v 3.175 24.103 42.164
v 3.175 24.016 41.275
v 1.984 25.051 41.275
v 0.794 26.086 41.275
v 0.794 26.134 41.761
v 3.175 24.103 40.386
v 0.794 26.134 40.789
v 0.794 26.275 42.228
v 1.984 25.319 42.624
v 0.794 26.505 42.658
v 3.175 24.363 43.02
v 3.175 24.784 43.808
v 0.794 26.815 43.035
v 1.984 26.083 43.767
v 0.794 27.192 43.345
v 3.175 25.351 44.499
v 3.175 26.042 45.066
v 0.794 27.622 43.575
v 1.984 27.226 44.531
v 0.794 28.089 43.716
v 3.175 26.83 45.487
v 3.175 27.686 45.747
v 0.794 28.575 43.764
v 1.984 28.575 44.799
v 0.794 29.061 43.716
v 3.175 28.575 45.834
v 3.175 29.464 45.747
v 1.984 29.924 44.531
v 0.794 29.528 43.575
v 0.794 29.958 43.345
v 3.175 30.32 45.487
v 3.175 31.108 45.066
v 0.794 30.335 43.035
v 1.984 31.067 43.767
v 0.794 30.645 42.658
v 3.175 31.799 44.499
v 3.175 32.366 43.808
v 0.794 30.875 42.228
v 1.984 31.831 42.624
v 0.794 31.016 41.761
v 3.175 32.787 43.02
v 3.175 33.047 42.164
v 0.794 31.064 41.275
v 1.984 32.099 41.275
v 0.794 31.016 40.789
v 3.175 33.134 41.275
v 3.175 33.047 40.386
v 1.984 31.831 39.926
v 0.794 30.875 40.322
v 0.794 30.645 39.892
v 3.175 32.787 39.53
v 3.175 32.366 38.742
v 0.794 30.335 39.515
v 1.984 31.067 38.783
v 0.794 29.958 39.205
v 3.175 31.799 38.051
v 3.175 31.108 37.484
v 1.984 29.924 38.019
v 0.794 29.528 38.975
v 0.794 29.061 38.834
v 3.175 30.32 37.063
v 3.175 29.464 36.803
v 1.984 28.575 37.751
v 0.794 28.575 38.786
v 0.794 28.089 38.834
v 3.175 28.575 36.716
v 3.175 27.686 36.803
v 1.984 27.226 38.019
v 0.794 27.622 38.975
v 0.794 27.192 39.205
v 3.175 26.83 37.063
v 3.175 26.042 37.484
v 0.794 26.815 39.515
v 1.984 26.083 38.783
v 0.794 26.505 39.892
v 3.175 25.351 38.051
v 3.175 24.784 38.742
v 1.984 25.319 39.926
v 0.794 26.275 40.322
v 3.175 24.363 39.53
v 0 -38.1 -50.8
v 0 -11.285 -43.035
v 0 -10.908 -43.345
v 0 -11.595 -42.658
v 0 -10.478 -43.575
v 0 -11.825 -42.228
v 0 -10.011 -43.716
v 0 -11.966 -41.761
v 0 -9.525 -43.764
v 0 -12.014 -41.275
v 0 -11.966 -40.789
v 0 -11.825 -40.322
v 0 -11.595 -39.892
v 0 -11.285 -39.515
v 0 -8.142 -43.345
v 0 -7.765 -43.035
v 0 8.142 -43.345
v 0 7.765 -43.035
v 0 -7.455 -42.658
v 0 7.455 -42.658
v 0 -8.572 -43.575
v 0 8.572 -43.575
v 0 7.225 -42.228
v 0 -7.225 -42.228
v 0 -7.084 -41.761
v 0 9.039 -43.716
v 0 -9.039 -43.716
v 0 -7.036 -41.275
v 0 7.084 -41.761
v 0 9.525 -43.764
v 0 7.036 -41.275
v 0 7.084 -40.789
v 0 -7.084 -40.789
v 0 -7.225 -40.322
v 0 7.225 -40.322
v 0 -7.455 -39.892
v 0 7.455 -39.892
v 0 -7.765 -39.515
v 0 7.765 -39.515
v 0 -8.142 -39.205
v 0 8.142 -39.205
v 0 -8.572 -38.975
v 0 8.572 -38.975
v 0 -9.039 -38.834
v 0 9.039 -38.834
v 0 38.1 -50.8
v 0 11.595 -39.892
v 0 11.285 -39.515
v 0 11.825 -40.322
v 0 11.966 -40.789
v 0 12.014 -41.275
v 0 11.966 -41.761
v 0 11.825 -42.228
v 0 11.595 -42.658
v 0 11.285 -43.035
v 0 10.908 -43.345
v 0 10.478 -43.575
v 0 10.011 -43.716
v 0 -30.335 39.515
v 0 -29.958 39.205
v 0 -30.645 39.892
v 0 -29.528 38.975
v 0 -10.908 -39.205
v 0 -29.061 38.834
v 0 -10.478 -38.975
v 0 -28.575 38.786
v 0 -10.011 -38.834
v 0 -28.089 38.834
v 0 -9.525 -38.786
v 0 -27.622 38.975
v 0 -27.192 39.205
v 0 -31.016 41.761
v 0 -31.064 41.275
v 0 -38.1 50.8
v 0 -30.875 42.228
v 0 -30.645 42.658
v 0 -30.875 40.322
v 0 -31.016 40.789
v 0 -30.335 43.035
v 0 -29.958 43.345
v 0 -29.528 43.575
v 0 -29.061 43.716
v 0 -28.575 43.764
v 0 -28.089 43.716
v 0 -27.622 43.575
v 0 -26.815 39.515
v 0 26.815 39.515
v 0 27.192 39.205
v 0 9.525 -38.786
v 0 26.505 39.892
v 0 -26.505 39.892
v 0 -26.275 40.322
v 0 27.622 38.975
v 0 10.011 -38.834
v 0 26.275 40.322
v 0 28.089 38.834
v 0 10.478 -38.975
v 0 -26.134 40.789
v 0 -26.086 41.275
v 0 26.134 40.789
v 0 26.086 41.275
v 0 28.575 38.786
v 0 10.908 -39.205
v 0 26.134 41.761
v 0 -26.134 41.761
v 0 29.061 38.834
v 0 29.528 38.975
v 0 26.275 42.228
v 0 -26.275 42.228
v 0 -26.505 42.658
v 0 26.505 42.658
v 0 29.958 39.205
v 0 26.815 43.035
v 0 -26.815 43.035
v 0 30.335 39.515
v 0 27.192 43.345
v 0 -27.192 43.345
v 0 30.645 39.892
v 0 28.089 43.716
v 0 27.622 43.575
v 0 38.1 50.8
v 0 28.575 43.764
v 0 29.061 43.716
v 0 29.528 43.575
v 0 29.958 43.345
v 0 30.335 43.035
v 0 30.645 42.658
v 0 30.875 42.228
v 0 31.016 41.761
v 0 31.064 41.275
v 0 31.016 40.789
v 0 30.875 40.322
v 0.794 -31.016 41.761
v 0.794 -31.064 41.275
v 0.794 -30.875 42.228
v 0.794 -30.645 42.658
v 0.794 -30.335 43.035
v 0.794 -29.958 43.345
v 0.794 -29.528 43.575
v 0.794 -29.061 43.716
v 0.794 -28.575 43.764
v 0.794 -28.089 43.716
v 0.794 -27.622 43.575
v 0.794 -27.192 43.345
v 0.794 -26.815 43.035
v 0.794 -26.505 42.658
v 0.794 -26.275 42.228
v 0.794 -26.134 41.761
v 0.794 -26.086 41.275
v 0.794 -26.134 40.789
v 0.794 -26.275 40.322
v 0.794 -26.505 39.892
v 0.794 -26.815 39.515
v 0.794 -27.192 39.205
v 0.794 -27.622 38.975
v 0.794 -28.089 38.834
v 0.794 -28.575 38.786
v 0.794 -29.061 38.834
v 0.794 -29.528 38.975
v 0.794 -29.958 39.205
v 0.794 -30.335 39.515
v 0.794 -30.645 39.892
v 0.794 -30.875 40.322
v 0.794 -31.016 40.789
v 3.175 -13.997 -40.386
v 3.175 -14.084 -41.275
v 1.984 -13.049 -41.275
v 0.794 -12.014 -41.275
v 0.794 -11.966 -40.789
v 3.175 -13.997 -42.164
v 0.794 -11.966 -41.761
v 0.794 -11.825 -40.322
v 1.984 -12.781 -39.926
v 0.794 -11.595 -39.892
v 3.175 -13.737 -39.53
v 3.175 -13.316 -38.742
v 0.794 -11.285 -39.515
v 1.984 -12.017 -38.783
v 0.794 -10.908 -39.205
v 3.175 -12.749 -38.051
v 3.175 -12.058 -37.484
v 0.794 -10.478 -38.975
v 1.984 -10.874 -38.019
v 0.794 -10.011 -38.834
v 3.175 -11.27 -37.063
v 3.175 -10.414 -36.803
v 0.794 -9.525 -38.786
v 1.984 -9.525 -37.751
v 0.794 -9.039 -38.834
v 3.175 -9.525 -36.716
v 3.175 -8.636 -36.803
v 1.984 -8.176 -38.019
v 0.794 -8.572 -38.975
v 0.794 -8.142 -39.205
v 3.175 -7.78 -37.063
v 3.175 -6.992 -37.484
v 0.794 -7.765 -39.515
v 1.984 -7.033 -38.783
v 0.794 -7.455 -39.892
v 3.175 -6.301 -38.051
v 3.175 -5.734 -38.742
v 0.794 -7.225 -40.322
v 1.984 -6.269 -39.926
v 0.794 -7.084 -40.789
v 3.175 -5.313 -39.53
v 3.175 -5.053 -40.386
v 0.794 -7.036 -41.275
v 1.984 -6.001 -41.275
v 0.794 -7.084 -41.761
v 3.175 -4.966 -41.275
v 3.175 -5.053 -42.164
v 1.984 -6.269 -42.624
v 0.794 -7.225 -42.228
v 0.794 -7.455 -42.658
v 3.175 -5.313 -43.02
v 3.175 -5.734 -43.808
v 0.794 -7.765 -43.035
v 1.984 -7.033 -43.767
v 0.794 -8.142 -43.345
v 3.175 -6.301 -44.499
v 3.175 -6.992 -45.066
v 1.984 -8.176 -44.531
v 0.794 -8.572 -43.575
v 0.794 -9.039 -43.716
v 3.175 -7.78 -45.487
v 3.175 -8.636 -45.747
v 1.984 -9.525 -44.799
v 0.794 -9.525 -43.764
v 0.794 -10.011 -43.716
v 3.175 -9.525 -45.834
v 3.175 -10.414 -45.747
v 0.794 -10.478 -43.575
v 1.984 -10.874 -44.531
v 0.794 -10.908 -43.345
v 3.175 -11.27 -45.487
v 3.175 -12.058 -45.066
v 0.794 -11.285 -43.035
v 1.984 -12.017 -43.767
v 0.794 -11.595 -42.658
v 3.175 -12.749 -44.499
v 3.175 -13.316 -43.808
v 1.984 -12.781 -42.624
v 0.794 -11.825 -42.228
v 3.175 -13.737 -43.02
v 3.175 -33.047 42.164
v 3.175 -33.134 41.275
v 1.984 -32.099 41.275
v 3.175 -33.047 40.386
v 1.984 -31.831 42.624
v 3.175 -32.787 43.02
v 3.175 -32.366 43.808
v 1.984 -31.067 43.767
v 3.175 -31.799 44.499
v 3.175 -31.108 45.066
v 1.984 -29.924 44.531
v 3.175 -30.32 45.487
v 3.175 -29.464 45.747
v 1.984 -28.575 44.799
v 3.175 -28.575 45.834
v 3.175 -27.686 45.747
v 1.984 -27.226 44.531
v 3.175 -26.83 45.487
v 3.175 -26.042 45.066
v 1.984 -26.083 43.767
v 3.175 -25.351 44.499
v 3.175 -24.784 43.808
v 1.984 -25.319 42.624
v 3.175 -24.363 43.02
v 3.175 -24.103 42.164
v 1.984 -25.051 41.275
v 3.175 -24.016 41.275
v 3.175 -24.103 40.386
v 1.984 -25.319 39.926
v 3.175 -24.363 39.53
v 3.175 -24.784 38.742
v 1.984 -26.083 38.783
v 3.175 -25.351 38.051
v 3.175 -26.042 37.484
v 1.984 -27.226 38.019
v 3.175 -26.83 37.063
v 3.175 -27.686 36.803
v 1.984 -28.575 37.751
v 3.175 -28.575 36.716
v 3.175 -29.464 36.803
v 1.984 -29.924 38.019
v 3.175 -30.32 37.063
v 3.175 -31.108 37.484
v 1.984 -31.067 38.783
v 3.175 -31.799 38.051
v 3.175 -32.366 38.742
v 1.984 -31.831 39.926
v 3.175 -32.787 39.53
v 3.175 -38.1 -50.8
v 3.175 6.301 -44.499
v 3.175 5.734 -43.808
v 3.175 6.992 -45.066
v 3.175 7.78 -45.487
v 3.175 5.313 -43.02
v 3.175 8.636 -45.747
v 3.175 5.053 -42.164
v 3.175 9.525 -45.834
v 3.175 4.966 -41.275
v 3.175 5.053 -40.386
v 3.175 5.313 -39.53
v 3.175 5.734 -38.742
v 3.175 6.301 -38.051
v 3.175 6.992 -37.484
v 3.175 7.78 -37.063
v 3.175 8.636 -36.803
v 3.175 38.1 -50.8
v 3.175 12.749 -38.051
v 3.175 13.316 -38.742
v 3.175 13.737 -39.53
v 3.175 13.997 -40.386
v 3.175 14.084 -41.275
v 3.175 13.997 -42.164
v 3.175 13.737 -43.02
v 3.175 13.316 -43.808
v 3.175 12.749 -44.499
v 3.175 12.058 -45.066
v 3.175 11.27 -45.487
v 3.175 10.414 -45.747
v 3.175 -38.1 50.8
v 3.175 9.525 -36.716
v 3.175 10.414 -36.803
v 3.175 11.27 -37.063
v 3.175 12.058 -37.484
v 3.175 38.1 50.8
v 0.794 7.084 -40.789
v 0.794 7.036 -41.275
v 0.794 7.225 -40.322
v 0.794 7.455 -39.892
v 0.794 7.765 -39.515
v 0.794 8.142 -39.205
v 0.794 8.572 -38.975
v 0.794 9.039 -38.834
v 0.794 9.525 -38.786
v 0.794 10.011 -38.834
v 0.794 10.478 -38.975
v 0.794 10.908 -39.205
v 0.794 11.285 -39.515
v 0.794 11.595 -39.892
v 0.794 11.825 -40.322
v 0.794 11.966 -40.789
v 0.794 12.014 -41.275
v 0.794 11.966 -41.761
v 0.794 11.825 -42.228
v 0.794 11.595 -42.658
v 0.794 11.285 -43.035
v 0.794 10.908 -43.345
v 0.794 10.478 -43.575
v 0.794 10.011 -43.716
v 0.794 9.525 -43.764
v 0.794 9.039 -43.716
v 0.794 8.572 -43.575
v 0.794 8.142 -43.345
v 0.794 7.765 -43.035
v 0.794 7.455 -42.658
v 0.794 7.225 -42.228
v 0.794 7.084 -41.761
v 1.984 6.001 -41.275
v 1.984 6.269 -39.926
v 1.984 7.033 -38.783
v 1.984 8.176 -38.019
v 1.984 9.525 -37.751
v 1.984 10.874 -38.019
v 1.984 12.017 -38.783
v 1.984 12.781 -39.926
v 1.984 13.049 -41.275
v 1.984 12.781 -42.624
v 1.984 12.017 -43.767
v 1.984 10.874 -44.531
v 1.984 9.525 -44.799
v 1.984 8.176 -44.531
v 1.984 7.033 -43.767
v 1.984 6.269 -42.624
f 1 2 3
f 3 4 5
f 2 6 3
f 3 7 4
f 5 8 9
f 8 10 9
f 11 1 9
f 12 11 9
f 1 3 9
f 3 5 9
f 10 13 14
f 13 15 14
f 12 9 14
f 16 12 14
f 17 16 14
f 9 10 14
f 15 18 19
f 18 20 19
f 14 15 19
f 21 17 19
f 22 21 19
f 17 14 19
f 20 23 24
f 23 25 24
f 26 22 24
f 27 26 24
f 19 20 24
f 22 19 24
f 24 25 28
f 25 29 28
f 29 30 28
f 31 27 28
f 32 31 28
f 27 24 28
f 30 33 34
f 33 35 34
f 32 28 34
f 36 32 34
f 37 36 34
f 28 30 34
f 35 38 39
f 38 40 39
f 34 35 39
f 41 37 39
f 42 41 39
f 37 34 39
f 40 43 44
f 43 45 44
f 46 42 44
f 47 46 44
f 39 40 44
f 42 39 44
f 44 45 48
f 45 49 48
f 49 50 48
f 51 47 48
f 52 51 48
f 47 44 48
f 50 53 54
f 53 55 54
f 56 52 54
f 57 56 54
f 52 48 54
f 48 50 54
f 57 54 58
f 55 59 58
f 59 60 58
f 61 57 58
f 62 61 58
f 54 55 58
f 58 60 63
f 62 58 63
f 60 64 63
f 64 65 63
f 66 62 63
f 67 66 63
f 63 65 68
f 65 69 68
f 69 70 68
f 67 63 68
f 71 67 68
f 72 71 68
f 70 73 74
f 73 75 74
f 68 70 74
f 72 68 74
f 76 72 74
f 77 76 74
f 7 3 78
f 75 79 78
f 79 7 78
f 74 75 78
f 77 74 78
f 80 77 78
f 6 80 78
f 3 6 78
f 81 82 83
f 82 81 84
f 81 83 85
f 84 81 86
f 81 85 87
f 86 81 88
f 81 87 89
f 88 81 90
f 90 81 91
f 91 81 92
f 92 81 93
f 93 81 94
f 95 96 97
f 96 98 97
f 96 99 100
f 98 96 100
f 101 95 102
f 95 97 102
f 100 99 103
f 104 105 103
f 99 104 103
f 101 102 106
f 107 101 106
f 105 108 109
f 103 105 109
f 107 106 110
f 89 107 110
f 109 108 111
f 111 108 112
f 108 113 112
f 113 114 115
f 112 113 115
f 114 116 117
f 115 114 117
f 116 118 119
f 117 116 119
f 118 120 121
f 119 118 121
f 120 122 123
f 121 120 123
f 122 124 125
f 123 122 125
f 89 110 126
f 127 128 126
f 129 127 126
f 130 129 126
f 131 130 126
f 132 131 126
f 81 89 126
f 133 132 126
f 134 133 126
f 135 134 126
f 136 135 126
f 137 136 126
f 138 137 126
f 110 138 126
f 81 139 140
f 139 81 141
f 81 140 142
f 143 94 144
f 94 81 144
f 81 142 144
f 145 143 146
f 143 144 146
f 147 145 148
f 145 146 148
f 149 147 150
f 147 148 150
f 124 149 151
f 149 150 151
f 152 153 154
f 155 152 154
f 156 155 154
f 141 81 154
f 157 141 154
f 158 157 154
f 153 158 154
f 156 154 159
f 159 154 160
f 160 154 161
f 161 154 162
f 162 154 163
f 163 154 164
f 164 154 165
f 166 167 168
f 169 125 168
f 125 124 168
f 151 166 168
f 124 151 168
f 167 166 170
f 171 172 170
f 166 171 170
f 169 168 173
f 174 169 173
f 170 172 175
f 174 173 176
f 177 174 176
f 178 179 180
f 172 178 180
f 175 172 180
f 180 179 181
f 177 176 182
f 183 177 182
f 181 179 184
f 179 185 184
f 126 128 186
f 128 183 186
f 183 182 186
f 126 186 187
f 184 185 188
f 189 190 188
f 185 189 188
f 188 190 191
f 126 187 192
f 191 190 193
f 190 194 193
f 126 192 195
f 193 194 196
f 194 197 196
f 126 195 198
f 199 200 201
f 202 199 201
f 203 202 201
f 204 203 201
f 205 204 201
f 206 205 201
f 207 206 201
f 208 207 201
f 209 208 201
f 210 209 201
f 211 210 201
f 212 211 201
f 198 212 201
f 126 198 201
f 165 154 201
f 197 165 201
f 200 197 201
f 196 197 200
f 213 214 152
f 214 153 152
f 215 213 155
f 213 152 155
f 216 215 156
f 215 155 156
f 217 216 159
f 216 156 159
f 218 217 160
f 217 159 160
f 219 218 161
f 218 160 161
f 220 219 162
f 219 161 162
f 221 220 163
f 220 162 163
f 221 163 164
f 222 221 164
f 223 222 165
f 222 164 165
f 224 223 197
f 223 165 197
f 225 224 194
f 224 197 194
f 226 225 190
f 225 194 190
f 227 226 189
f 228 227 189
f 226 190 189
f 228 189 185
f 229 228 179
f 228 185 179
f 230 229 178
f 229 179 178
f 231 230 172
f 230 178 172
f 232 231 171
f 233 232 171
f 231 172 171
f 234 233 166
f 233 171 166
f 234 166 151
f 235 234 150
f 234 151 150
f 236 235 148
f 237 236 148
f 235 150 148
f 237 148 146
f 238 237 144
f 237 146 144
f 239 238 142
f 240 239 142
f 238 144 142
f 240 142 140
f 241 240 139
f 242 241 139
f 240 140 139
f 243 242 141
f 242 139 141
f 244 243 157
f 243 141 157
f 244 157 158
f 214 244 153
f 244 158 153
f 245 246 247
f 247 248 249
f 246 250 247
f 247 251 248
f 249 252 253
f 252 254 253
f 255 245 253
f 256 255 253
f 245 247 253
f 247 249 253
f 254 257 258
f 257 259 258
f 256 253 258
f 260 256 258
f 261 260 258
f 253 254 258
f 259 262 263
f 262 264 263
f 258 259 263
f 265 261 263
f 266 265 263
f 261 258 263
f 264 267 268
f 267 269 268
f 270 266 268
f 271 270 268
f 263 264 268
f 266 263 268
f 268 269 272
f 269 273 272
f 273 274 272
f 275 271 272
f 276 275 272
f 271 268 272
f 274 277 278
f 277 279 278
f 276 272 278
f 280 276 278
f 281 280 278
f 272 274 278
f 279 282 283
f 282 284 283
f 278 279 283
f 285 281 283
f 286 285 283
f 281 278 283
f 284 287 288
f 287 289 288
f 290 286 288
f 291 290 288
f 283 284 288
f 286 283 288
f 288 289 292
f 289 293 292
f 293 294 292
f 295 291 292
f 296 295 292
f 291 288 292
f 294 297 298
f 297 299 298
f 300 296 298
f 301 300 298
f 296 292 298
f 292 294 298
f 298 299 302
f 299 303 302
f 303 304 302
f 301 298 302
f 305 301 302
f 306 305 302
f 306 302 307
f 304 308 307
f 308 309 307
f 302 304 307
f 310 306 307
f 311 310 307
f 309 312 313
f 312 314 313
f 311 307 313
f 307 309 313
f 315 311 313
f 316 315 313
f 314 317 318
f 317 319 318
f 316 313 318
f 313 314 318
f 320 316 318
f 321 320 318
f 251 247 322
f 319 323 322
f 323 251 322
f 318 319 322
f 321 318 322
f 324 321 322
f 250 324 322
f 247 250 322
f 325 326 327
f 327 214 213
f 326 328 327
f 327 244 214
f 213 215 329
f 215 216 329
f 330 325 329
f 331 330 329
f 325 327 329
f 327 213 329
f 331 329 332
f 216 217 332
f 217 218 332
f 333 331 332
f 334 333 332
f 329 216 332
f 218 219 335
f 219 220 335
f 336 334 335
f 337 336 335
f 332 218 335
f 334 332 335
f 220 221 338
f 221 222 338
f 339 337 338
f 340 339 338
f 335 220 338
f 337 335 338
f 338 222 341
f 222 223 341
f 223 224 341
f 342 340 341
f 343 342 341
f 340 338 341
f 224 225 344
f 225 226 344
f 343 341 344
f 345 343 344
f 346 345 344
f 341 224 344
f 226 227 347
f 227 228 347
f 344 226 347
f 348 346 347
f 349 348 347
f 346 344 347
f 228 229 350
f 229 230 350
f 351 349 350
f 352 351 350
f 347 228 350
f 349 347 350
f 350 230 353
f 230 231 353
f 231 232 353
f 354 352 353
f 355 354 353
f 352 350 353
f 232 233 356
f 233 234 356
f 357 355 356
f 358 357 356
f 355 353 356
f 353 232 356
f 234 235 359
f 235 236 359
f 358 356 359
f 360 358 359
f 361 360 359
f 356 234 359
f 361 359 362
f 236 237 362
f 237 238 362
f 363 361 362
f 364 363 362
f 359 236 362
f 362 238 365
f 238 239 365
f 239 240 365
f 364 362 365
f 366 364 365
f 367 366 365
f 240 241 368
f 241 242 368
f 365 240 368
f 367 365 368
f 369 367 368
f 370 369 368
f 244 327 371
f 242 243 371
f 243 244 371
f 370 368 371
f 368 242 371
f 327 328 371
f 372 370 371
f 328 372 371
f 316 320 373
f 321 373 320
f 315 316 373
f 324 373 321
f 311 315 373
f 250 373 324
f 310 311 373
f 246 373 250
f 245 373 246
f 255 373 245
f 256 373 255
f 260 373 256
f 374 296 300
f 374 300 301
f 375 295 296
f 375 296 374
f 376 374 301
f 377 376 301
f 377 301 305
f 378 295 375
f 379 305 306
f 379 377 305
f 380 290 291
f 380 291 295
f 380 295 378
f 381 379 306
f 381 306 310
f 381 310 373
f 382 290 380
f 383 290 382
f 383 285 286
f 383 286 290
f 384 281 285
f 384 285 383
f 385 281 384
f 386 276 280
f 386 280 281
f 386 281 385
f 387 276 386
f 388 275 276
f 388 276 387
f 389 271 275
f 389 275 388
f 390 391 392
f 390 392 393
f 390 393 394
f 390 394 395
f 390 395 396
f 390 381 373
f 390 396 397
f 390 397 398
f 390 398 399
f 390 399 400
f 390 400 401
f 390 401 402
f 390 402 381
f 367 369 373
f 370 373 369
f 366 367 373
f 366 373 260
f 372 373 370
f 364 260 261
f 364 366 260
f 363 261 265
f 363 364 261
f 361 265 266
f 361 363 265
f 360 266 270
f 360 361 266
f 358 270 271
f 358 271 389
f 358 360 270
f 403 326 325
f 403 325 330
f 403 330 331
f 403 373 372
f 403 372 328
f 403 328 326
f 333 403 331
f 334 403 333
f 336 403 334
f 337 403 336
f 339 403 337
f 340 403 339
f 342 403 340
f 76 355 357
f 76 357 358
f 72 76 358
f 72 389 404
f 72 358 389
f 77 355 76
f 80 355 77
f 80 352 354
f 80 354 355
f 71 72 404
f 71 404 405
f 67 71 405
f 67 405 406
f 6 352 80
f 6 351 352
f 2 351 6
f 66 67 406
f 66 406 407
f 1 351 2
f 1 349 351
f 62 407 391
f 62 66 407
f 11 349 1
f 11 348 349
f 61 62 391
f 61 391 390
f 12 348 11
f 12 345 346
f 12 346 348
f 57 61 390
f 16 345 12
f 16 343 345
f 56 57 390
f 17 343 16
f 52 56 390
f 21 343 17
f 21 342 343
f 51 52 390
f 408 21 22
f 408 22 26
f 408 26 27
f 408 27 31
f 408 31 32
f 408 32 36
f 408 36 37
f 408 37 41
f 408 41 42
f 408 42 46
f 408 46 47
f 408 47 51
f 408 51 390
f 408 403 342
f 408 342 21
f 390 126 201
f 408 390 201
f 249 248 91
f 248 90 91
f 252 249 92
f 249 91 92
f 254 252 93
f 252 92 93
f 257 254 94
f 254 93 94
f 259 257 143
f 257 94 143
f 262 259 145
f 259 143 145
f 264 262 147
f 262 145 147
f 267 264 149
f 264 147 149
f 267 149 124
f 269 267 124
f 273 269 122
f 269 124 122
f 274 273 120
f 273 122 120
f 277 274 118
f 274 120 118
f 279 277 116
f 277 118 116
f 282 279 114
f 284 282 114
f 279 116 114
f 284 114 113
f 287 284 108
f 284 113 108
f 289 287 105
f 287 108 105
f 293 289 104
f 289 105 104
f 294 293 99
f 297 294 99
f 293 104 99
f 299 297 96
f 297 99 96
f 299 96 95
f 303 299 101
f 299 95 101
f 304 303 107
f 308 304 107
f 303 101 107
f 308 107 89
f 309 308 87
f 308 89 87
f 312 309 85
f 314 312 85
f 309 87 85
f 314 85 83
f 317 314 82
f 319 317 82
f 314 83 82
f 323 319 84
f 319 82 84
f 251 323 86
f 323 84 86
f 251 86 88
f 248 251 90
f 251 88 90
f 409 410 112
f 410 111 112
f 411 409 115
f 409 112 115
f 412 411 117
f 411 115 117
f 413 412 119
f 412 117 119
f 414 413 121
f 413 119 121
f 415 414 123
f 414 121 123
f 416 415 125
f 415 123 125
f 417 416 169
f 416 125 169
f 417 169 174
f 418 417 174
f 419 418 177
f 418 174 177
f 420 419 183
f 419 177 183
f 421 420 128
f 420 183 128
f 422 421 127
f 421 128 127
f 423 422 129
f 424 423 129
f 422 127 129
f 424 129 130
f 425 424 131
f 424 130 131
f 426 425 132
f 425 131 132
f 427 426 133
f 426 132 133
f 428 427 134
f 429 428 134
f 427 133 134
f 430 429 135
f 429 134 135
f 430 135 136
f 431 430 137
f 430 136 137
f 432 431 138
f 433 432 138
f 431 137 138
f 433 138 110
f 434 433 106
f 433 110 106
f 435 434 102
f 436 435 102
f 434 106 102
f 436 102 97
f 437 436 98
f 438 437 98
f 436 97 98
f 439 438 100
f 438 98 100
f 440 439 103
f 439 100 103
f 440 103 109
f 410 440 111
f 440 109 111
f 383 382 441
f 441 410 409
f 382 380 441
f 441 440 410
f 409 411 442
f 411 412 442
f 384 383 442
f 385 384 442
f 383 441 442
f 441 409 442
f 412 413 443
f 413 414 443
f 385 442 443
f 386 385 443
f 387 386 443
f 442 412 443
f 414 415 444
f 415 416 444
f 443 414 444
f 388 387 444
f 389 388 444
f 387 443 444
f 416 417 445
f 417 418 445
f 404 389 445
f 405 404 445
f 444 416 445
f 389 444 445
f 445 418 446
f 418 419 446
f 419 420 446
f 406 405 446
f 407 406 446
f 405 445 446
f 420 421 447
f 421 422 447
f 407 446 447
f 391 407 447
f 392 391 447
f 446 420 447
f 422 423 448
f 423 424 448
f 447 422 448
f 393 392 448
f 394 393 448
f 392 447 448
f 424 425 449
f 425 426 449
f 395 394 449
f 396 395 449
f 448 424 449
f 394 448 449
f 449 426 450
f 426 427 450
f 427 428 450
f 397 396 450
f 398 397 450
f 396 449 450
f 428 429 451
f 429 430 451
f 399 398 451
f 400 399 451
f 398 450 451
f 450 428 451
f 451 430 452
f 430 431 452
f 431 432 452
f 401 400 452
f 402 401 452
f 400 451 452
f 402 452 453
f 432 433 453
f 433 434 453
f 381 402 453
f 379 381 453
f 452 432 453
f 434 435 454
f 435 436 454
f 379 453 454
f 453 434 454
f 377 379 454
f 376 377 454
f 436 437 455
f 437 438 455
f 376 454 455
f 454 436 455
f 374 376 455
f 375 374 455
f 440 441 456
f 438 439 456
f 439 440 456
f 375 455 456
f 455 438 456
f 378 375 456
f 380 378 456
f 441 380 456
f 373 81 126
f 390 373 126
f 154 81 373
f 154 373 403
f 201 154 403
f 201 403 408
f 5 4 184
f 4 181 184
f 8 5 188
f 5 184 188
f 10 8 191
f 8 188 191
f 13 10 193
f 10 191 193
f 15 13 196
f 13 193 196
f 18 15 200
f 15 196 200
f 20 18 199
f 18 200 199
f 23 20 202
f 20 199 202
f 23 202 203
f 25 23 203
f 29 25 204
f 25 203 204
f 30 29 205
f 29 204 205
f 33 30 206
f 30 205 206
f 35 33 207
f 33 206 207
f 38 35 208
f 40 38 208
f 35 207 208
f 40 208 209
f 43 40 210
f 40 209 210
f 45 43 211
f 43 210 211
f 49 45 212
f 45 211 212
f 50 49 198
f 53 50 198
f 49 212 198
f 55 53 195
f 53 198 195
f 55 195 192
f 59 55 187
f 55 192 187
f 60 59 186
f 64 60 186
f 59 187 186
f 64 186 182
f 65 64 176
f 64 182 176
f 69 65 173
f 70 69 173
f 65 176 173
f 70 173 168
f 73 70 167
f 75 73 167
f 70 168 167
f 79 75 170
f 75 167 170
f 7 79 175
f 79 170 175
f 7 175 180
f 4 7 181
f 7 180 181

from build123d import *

# Parameters (mm, degrees)
F0_W           = 76.2
F0_H           = 101.6
F1_DEPTH       = 3.175
F3_D           = 4.9784
F3_CSINK_D     = 9.1186
F3_CSINK_ANGLE = 82


with BuildPart() as f1:
    # F0 (on Right) → F1 (new body)
    with BuildSketch(Plane.YZ):
        Rectangle(F0_W, F0_H)
    extrude(amount=F1_DEPTH)

    # F3 (through all)
    with Locations(Plane.YZ.offset(3.175)):
        with Locations((-28.575, 41.275), (28.575, 41.275), (9.525, -41.275), (-9.525, -41.275)):
            CounterSinkHole(F3_D / 2, F3_CSINK_D / 2, counter_sink_angle=F3_CSINK_ANGLE)


solid = f1.part
